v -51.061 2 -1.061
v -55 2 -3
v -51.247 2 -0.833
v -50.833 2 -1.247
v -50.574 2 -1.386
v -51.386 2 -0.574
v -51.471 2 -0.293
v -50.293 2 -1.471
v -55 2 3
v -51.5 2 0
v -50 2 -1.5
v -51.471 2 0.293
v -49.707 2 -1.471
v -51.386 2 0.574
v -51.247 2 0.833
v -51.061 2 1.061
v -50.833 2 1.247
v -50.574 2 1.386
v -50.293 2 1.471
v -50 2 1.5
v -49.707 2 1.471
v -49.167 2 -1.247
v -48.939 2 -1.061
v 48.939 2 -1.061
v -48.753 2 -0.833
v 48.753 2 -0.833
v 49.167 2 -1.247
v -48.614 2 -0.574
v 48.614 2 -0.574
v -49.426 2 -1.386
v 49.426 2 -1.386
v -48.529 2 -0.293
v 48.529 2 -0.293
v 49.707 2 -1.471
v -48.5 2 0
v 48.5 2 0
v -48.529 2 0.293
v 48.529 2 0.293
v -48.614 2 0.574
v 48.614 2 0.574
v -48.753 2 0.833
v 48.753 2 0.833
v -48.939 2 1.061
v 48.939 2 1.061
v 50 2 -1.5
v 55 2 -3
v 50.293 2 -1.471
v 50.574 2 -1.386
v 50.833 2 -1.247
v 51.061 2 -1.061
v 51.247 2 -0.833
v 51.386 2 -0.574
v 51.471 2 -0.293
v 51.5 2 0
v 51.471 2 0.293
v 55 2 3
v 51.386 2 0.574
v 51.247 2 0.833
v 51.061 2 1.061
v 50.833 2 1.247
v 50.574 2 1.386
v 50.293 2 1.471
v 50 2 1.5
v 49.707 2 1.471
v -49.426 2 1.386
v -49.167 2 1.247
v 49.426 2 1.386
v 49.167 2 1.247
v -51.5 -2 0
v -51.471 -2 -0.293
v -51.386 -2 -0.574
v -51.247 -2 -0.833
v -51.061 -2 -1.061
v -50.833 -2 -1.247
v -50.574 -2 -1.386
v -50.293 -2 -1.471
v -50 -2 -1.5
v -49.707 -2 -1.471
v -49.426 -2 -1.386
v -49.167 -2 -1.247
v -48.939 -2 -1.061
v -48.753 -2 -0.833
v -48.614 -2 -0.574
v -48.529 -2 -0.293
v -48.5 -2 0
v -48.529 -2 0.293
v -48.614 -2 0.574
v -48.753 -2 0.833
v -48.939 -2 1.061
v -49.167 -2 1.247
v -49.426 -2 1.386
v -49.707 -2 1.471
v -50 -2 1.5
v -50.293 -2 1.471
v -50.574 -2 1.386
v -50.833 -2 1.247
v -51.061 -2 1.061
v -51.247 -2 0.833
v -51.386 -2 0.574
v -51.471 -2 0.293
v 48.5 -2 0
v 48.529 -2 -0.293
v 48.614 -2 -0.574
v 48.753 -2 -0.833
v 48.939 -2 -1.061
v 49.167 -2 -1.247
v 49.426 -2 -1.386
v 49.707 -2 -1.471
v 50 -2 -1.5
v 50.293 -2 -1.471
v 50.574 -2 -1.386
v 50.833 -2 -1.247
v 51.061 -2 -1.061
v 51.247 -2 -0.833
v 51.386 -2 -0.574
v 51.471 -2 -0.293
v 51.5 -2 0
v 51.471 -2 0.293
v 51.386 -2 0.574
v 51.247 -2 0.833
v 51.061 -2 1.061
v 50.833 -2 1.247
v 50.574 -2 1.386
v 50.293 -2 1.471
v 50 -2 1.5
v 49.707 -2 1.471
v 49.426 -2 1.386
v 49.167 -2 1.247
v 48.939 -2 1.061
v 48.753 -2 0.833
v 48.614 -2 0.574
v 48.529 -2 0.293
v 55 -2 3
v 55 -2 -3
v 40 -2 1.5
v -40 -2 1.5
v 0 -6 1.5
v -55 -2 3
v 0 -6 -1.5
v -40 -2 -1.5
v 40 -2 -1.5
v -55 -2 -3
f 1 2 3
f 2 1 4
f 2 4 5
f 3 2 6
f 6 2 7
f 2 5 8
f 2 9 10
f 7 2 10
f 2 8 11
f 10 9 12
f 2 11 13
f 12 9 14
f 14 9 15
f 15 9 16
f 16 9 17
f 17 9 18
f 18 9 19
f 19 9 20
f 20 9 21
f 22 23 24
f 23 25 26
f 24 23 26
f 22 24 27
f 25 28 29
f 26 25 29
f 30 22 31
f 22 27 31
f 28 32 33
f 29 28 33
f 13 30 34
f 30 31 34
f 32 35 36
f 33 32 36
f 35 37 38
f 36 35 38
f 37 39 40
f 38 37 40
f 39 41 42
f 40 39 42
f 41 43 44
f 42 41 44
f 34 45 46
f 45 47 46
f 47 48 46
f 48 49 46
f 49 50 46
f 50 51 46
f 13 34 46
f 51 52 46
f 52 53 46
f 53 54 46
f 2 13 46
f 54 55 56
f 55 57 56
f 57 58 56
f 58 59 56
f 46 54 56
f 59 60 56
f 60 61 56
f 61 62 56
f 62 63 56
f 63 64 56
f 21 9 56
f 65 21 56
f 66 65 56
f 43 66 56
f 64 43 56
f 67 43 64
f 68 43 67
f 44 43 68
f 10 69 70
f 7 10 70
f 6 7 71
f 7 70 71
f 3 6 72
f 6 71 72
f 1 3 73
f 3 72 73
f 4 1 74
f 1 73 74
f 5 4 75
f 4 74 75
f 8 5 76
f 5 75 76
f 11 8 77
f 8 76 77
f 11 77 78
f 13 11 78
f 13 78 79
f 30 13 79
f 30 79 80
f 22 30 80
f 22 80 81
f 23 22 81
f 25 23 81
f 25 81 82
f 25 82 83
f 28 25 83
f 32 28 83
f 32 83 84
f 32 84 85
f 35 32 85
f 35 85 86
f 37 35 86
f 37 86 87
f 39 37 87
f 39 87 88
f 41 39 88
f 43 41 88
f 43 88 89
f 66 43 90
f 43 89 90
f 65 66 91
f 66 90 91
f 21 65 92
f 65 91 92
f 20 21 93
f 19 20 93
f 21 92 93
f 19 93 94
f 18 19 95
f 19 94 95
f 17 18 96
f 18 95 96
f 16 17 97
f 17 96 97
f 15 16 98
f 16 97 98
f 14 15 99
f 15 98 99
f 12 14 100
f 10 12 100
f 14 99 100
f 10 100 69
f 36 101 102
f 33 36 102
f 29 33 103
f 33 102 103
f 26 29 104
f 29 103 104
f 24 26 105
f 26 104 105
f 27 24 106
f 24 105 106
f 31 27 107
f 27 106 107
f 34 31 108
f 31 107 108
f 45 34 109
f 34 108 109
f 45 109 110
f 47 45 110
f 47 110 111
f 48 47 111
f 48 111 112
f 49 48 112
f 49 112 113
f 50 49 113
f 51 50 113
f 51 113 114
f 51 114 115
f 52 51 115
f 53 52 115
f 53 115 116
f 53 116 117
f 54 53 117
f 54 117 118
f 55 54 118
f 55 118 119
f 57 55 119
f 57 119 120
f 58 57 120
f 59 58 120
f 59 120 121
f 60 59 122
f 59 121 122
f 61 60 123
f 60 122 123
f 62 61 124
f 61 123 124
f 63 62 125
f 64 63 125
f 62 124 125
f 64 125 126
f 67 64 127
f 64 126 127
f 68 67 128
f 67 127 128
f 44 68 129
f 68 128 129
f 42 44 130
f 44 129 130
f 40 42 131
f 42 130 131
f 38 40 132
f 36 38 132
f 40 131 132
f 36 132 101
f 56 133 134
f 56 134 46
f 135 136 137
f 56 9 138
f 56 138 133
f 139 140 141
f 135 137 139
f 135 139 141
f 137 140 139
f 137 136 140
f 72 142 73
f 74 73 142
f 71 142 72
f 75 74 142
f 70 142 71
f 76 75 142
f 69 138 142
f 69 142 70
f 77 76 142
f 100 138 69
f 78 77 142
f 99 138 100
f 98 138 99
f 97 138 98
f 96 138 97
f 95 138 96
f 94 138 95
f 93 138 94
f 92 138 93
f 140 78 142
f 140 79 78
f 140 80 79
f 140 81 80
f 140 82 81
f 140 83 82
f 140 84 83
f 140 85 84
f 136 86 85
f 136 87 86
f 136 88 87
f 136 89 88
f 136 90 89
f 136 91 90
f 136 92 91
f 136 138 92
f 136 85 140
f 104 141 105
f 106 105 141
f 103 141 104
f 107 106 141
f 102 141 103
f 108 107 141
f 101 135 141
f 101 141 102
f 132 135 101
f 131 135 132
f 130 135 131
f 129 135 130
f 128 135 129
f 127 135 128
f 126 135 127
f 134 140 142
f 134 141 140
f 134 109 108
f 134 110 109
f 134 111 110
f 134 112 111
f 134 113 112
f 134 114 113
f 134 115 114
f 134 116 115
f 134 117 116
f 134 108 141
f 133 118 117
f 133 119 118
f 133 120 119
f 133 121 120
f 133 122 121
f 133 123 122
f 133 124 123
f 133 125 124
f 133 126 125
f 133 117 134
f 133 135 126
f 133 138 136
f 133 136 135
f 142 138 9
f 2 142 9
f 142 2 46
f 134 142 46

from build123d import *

# Parameters (mm, degrees)
SKETCH1_W                = 110
SKETCH1_H                = 4
BOSS_EXTRUDE1_DEPTH      = 3
BOSS_EXTRUDE2_DEPTH      = 1.5
F_3_0_3_DIAMETER_HOLE1_D = 3


with BuildPart() as part:
    # Sketch1 → Boss-Extrude1 (new, symmetric)
    with BuildSketch(Plane.XY):
        Rectangle(SKETCH1_W, SKETCH1_H)
    extrude(amount=BOSS_EXTRUDE1_DEPTH, both=True)

    # Sketch2 → Boss-Extrude2 (add, symmetric)
    with BuildSketch(Plane.XY):
        Polygon((-40, -2), (0, -6), (40, -2), align=None)
    extrude(amount=BOSS_EXTRUDE2_DEPTH, both=True)

    # Ø3.0 (3) Diameter Hole1 (through all)
    with Locations(Plane(origin=(0, 2, 0), x_dir=(1, 0, 0), z_dir=(0, 1, 0))):
        with Locations((-50, 0), (50, 0)):
            Hole(F_3_0_3_DIAMETER_HOLE1_D / 2)


solid = part.part
